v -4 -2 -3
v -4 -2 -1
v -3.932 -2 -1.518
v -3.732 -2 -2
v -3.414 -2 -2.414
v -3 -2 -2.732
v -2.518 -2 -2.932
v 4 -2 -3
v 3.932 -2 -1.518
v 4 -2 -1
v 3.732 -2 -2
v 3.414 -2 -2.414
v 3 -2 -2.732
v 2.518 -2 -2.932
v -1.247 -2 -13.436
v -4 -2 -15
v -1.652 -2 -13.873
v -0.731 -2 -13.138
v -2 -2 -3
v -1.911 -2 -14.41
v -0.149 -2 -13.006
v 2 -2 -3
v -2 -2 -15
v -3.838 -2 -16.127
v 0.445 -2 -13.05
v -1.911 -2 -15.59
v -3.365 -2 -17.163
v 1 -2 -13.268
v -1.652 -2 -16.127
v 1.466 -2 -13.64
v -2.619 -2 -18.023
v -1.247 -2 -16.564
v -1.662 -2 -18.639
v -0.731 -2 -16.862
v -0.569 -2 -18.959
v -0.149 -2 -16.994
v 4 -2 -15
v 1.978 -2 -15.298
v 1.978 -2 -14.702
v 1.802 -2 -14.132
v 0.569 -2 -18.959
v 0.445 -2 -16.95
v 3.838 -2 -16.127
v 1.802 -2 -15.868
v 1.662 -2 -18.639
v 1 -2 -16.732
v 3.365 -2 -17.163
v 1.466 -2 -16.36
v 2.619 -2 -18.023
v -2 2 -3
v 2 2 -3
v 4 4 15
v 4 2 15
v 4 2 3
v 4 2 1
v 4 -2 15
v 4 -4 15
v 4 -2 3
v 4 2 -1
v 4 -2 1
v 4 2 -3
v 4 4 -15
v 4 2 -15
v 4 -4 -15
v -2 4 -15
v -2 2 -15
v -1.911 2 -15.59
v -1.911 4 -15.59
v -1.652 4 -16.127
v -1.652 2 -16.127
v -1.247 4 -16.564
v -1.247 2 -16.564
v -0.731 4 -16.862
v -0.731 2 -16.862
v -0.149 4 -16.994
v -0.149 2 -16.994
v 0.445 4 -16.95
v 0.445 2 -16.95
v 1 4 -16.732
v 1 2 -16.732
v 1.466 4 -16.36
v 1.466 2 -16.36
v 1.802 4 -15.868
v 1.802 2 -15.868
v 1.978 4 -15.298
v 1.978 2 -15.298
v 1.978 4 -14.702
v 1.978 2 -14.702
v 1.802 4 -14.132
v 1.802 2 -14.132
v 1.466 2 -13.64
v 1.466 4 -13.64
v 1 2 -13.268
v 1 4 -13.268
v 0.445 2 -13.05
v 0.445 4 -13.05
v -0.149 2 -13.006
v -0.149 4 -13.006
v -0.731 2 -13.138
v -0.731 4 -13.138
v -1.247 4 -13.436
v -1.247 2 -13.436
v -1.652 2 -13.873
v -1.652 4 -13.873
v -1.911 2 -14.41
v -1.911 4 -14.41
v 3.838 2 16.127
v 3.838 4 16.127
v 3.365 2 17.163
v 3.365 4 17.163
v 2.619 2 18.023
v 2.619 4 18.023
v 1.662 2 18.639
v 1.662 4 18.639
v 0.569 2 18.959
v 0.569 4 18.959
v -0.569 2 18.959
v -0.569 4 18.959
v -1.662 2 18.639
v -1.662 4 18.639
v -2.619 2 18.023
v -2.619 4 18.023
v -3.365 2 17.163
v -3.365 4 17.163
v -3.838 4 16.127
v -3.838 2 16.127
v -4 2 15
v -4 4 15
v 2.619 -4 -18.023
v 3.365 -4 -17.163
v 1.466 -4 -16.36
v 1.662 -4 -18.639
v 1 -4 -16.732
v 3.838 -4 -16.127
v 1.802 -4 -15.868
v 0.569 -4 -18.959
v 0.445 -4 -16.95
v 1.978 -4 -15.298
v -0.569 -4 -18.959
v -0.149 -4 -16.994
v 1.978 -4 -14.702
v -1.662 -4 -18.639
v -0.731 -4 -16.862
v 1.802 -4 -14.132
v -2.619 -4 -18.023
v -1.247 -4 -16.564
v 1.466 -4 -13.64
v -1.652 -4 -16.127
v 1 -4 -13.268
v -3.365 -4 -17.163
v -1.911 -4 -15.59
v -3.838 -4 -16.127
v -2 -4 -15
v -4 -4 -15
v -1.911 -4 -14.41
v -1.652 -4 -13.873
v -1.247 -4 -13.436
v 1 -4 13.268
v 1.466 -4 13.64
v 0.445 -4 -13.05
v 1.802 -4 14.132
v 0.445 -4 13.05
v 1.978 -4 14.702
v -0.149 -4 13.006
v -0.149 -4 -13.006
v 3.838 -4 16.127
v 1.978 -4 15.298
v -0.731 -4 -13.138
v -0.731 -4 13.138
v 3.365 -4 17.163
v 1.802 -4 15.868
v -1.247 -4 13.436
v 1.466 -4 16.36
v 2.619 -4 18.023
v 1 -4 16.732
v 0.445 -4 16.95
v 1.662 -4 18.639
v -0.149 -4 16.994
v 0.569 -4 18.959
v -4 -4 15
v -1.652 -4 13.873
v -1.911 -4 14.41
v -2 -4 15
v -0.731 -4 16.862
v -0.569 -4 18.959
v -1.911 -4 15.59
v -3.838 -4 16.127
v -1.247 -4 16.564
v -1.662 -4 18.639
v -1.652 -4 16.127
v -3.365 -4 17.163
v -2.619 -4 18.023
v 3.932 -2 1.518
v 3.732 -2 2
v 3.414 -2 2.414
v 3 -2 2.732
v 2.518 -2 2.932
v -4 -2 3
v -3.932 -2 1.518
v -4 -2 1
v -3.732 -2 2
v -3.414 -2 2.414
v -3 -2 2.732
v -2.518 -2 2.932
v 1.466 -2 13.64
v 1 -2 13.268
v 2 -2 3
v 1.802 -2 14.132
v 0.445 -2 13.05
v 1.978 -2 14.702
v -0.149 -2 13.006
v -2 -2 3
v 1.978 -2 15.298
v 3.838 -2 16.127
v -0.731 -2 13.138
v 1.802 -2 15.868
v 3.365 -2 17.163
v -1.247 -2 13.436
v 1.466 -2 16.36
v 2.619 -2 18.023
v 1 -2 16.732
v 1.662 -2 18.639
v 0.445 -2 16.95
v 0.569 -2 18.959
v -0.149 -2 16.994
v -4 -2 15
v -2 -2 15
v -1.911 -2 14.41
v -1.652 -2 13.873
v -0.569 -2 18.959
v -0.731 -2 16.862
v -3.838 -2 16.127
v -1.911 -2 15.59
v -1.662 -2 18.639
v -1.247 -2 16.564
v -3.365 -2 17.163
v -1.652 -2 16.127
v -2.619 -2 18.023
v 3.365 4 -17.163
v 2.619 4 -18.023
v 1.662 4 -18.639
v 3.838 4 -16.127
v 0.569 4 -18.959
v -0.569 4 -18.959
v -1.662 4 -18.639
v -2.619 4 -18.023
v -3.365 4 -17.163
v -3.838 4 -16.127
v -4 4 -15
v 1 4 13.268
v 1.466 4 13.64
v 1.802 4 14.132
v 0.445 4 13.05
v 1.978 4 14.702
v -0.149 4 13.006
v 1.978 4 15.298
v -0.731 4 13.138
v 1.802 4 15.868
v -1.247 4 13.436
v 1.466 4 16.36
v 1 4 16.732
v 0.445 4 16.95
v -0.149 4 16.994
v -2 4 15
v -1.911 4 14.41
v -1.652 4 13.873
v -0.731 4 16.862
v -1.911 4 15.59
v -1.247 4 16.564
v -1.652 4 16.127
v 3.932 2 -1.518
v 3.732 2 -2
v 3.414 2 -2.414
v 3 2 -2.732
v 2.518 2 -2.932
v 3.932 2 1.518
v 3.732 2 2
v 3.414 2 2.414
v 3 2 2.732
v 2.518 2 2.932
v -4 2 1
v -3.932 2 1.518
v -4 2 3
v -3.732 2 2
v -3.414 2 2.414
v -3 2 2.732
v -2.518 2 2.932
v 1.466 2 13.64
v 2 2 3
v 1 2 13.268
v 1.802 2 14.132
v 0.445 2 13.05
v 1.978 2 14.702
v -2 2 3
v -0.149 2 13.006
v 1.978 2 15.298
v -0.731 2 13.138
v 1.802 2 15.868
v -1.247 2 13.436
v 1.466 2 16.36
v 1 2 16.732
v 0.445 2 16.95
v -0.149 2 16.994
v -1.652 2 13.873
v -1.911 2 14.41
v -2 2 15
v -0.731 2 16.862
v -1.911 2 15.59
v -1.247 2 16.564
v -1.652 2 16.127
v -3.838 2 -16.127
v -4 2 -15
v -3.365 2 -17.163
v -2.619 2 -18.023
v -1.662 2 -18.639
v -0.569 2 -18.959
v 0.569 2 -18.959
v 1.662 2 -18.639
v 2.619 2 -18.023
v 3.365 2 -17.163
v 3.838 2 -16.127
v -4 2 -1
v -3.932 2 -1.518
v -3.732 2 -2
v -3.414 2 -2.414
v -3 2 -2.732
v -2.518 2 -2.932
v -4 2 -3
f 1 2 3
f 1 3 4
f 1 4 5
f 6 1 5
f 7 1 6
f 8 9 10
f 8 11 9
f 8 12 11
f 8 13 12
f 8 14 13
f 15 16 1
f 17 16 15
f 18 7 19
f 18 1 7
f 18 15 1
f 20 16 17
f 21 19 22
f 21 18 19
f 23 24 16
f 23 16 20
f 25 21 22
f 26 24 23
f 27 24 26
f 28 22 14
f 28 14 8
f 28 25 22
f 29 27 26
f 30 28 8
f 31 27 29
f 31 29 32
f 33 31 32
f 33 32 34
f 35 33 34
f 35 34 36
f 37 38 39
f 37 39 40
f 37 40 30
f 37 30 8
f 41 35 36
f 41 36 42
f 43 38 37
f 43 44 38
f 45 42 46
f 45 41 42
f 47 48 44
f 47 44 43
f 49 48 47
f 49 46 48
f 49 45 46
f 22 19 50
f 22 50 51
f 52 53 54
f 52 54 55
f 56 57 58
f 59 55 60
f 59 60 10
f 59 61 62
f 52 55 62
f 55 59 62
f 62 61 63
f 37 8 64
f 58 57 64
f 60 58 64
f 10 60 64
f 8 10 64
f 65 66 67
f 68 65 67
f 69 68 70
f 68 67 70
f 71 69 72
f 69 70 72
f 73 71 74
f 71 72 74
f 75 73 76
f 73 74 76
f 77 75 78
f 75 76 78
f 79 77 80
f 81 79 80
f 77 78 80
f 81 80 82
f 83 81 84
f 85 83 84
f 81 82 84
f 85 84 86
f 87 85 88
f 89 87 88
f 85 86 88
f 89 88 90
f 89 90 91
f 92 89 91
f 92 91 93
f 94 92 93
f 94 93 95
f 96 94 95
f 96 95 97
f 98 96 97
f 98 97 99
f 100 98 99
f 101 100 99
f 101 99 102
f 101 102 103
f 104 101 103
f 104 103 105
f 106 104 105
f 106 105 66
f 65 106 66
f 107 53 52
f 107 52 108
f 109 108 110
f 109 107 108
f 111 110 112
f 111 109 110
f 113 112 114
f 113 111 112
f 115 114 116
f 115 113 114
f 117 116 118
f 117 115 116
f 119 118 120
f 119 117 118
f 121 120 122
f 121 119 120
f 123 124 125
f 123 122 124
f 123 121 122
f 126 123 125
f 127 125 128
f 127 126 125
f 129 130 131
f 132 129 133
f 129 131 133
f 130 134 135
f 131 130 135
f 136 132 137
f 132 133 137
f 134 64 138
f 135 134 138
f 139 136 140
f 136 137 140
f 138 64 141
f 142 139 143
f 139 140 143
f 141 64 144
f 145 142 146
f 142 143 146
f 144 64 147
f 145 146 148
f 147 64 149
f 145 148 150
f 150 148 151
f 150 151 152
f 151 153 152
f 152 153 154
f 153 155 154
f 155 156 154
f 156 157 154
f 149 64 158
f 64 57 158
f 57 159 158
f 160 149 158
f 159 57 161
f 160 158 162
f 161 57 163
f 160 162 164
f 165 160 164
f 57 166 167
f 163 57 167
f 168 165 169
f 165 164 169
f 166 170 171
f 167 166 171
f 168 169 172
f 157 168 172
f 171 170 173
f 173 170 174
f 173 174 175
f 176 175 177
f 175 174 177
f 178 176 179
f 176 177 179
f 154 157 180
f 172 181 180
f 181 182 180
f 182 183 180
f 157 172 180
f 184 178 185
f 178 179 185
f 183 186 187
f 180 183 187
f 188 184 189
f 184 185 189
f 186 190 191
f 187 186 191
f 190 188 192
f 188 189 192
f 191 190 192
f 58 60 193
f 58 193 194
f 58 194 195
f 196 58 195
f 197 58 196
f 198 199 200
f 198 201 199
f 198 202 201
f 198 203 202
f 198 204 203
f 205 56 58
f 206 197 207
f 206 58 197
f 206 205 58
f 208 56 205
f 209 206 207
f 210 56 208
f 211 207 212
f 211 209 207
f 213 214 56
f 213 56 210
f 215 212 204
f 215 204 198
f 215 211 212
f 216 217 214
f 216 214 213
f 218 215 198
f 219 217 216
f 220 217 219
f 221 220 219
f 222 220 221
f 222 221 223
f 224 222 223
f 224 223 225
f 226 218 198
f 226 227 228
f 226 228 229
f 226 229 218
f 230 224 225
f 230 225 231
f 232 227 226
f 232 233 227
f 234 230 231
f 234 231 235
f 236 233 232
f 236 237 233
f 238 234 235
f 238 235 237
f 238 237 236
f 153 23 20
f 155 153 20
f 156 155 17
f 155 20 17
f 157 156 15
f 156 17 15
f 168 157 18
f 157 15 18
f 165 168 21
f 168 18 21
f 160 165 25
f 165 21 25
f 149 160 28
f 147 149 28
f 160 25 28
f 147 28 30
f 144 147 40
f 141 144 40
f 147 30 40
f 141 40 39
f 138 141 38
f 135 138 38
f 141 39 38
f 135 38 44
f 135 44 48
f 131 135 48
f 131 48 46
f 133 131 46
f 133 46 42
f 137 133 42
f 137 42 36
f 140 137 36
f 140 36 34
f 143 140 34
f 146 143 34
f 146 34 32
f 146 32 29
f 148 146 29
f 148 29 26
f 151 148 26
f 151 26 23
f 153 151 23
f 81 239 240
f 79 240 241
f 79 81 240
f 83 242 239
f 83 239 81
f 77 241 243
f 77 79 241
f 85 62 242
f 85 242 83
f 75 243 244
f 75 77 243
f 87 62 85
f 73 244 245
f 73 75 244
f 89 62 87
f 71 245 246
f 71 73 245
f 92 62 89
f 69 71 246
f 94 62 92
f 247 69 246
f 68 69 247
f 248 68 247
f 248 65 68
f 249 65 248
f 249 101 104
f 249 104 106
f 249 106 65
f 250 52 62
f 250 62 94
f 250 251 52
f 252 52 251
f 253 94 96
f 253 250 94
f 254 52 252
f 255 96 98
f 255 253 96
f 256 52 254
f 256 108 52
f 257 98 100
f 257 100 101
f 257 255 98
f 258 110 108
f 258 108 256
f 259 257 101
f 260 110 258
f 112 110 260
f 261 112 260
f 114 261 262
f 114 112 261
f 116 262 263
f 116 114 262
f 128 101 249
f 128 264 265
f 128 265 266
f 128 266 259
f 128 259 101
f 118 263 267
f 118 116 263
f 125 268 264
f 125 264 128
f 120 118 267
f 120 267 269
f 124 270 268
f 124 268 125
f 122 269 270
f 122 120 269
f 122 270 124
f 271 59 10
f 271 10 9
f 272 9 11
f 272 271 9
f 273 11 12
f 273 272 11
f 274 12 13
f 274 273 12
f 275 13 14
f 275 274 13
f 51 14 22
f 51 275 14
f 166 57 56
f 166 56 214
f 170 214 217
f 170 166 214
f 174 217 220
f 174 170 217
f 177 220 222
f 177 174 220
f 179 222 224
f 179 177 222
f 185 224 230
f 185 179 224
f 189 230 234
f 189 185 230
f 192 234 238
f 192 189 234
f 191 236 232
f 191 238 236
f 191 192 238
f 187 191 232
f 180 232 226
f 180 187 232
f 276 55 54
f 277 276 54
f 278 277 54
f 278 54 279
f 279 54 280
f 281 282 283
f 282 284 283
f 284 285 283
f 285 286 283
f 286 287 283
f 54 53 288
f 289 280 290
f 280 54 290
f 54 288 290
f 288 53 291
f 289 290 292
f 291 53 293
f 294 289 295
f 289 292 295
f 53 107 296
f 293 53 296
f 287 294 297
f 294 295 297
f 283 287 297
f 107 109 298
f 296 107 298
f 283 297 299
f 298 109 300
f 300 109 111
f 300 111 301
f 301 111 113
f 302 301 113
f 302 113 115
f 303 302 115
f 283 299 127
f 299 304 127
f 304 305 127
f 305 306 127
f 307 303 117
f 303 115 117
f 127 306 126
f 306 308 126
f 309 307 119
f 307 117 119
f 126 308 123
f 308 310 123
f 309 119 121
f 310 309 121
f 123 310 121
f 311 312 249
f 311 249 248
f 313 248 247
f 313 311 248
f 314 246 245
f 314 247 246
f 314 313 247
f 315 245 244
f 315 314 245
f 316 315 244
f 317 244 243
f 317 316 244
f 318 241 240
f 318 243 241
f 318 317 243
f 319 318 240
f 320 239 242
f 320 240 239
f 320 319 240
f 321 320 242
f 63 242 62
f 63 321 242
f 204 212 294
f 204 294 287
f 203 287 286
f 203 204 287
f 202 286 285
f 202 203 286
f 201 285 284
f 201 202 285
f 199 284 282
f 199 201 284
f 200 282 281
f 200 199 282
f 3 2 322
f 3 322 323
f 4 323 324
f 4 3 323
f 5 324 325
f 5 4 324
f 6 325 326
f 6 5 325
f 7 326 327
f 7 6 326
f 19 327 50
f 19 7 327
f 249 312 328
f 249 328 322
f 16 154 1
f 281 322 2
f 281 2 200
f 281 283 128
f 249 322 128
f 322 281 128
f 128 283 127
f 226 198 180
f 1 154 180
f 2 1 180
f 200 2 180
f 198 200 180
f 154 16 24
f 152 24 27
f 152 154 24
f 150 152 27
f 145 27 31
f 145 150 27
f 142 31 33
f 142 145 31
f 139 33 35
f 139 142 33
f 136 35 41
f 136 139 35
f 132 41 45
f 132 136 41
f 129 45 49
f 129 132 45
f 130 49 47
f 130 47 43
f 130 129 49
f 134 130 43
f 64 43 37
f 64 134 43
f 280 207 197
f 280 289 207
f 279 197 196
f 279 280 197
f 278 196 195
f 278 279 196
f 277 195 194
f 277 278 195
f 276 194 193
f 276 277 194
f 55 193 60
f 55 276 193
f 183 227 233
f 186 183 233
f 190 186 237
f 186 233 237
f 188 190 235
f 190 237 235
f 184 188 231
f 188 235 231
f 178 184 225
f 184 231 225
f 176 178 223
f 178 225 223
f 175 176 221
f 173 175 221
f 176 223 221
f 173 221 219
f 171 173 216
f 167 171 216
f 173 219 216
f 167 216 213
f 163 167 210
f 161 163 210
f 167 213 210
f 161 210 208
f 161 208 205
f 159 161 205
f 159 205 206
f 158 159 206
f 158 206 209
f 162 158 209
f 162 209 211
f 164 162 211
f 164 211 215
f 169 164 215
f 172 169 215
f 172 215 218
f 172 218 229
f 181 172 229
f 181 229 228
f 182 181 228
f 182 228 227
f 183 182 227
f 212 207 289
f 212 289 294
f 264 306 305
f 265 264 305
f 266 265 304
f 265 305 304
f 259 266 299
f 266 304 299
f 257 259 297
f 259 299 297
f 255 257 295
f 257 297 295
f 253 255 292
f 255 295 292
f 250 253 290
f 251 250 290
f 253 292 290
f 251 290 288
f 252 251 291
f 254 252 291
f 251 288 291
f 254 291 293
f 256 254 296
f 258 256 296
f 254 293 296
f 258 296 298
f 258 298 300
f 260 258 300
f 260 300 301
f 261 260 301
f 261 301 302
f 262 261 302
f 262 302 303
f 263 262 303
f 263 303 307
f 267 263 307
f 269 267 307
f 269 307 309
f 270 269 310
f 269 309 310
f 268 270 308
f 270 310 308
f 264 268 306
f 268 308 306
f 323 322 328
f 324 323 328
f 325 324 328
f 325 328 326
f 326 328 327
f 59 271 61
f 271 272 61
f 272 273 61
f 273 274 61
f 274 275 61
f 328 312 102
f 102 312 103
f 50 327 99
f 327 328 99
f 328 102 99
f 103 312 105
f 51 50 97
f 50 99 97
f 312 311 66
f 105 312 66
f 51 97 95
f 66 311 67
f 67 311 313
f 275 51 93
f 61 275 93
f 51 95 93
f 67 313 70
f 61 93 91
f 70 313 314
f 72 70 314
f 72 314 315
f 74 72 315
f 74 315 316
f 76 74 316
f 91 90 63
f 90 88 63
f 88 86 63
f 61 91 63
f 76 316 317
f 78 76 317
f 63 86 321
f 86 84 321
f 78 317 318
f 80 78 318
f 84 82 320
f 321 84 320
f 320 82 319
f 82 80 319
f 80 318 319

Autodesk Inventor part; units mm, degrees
ref_plane "YZ Plane" through (0, 0, 0) normal (1, 0, 0) x (0, 1, 0)
ref_plane "XZ Plane" through (0, 0, 0) normal (0, 1, 0) x (-1, 0, 0)
ref_plane "XY Plane" through (0, 0, 0) normal (0, 0, 1) x (1, 0, 0)
sketch "Szkic1" plane through (0, 0, 0) normal (0, 1, 0) x (-1, 0, 0)
  line L0 (0, 15) -> (0, -15) construction
  line L1 (-4, 15) -> (-4, -15)
  line L2 (4, -15) -> (4, 15)
  arc A0 (4, 15) -> (-4, 15) centre (0, 15) ccw
  arc A1 (-4, -15) -> (4, -15) centre (0, -15) ccw
  circle A2 centre (0, -15) radius 2
  circle A3 centre (0, 15) radius 2
  line L3 (0, 15) -> (0, 3)
  line L4 (0, 3) -> (4, 3)
  line L5 (0, 3) -> (-4, 3)
  point P0 (0, 0)
  dimension "d0" = 15
  dimension "d1" = 8
  dimension "d2" = 4
  dimension "d3" = 4
  dimension "d6" = 12
extrude "Wyciągnięcie proste1" add sketch "Szkic1" along normal mid plane 8 contours A0 L2 L4 L5 L1 | L5 L4 L2 A1 L1 | A2 | A3
extrude "Wyciągnięcie proste2" cut sketch "Szkic1" along normal mid plane 4 contours A0 L2 L4 L5 L1
extrude "Wyciągnięcie proste3" cut sketch "Szkic1" along normal mid plane 14.5 contours A3
mirror "Odbij1" about plane through (0, 0, 0) normal (0, 0, 1) of "Wyciągnięcie proste2", "Wyciągnięcie proste3"
fillet "Zaokrąglenie1" radius 2 4 edges at (-4, 0, 3) (-4, 0, -3) (4, 0, -3) (4, 0, 3)
properties part number "connector"
